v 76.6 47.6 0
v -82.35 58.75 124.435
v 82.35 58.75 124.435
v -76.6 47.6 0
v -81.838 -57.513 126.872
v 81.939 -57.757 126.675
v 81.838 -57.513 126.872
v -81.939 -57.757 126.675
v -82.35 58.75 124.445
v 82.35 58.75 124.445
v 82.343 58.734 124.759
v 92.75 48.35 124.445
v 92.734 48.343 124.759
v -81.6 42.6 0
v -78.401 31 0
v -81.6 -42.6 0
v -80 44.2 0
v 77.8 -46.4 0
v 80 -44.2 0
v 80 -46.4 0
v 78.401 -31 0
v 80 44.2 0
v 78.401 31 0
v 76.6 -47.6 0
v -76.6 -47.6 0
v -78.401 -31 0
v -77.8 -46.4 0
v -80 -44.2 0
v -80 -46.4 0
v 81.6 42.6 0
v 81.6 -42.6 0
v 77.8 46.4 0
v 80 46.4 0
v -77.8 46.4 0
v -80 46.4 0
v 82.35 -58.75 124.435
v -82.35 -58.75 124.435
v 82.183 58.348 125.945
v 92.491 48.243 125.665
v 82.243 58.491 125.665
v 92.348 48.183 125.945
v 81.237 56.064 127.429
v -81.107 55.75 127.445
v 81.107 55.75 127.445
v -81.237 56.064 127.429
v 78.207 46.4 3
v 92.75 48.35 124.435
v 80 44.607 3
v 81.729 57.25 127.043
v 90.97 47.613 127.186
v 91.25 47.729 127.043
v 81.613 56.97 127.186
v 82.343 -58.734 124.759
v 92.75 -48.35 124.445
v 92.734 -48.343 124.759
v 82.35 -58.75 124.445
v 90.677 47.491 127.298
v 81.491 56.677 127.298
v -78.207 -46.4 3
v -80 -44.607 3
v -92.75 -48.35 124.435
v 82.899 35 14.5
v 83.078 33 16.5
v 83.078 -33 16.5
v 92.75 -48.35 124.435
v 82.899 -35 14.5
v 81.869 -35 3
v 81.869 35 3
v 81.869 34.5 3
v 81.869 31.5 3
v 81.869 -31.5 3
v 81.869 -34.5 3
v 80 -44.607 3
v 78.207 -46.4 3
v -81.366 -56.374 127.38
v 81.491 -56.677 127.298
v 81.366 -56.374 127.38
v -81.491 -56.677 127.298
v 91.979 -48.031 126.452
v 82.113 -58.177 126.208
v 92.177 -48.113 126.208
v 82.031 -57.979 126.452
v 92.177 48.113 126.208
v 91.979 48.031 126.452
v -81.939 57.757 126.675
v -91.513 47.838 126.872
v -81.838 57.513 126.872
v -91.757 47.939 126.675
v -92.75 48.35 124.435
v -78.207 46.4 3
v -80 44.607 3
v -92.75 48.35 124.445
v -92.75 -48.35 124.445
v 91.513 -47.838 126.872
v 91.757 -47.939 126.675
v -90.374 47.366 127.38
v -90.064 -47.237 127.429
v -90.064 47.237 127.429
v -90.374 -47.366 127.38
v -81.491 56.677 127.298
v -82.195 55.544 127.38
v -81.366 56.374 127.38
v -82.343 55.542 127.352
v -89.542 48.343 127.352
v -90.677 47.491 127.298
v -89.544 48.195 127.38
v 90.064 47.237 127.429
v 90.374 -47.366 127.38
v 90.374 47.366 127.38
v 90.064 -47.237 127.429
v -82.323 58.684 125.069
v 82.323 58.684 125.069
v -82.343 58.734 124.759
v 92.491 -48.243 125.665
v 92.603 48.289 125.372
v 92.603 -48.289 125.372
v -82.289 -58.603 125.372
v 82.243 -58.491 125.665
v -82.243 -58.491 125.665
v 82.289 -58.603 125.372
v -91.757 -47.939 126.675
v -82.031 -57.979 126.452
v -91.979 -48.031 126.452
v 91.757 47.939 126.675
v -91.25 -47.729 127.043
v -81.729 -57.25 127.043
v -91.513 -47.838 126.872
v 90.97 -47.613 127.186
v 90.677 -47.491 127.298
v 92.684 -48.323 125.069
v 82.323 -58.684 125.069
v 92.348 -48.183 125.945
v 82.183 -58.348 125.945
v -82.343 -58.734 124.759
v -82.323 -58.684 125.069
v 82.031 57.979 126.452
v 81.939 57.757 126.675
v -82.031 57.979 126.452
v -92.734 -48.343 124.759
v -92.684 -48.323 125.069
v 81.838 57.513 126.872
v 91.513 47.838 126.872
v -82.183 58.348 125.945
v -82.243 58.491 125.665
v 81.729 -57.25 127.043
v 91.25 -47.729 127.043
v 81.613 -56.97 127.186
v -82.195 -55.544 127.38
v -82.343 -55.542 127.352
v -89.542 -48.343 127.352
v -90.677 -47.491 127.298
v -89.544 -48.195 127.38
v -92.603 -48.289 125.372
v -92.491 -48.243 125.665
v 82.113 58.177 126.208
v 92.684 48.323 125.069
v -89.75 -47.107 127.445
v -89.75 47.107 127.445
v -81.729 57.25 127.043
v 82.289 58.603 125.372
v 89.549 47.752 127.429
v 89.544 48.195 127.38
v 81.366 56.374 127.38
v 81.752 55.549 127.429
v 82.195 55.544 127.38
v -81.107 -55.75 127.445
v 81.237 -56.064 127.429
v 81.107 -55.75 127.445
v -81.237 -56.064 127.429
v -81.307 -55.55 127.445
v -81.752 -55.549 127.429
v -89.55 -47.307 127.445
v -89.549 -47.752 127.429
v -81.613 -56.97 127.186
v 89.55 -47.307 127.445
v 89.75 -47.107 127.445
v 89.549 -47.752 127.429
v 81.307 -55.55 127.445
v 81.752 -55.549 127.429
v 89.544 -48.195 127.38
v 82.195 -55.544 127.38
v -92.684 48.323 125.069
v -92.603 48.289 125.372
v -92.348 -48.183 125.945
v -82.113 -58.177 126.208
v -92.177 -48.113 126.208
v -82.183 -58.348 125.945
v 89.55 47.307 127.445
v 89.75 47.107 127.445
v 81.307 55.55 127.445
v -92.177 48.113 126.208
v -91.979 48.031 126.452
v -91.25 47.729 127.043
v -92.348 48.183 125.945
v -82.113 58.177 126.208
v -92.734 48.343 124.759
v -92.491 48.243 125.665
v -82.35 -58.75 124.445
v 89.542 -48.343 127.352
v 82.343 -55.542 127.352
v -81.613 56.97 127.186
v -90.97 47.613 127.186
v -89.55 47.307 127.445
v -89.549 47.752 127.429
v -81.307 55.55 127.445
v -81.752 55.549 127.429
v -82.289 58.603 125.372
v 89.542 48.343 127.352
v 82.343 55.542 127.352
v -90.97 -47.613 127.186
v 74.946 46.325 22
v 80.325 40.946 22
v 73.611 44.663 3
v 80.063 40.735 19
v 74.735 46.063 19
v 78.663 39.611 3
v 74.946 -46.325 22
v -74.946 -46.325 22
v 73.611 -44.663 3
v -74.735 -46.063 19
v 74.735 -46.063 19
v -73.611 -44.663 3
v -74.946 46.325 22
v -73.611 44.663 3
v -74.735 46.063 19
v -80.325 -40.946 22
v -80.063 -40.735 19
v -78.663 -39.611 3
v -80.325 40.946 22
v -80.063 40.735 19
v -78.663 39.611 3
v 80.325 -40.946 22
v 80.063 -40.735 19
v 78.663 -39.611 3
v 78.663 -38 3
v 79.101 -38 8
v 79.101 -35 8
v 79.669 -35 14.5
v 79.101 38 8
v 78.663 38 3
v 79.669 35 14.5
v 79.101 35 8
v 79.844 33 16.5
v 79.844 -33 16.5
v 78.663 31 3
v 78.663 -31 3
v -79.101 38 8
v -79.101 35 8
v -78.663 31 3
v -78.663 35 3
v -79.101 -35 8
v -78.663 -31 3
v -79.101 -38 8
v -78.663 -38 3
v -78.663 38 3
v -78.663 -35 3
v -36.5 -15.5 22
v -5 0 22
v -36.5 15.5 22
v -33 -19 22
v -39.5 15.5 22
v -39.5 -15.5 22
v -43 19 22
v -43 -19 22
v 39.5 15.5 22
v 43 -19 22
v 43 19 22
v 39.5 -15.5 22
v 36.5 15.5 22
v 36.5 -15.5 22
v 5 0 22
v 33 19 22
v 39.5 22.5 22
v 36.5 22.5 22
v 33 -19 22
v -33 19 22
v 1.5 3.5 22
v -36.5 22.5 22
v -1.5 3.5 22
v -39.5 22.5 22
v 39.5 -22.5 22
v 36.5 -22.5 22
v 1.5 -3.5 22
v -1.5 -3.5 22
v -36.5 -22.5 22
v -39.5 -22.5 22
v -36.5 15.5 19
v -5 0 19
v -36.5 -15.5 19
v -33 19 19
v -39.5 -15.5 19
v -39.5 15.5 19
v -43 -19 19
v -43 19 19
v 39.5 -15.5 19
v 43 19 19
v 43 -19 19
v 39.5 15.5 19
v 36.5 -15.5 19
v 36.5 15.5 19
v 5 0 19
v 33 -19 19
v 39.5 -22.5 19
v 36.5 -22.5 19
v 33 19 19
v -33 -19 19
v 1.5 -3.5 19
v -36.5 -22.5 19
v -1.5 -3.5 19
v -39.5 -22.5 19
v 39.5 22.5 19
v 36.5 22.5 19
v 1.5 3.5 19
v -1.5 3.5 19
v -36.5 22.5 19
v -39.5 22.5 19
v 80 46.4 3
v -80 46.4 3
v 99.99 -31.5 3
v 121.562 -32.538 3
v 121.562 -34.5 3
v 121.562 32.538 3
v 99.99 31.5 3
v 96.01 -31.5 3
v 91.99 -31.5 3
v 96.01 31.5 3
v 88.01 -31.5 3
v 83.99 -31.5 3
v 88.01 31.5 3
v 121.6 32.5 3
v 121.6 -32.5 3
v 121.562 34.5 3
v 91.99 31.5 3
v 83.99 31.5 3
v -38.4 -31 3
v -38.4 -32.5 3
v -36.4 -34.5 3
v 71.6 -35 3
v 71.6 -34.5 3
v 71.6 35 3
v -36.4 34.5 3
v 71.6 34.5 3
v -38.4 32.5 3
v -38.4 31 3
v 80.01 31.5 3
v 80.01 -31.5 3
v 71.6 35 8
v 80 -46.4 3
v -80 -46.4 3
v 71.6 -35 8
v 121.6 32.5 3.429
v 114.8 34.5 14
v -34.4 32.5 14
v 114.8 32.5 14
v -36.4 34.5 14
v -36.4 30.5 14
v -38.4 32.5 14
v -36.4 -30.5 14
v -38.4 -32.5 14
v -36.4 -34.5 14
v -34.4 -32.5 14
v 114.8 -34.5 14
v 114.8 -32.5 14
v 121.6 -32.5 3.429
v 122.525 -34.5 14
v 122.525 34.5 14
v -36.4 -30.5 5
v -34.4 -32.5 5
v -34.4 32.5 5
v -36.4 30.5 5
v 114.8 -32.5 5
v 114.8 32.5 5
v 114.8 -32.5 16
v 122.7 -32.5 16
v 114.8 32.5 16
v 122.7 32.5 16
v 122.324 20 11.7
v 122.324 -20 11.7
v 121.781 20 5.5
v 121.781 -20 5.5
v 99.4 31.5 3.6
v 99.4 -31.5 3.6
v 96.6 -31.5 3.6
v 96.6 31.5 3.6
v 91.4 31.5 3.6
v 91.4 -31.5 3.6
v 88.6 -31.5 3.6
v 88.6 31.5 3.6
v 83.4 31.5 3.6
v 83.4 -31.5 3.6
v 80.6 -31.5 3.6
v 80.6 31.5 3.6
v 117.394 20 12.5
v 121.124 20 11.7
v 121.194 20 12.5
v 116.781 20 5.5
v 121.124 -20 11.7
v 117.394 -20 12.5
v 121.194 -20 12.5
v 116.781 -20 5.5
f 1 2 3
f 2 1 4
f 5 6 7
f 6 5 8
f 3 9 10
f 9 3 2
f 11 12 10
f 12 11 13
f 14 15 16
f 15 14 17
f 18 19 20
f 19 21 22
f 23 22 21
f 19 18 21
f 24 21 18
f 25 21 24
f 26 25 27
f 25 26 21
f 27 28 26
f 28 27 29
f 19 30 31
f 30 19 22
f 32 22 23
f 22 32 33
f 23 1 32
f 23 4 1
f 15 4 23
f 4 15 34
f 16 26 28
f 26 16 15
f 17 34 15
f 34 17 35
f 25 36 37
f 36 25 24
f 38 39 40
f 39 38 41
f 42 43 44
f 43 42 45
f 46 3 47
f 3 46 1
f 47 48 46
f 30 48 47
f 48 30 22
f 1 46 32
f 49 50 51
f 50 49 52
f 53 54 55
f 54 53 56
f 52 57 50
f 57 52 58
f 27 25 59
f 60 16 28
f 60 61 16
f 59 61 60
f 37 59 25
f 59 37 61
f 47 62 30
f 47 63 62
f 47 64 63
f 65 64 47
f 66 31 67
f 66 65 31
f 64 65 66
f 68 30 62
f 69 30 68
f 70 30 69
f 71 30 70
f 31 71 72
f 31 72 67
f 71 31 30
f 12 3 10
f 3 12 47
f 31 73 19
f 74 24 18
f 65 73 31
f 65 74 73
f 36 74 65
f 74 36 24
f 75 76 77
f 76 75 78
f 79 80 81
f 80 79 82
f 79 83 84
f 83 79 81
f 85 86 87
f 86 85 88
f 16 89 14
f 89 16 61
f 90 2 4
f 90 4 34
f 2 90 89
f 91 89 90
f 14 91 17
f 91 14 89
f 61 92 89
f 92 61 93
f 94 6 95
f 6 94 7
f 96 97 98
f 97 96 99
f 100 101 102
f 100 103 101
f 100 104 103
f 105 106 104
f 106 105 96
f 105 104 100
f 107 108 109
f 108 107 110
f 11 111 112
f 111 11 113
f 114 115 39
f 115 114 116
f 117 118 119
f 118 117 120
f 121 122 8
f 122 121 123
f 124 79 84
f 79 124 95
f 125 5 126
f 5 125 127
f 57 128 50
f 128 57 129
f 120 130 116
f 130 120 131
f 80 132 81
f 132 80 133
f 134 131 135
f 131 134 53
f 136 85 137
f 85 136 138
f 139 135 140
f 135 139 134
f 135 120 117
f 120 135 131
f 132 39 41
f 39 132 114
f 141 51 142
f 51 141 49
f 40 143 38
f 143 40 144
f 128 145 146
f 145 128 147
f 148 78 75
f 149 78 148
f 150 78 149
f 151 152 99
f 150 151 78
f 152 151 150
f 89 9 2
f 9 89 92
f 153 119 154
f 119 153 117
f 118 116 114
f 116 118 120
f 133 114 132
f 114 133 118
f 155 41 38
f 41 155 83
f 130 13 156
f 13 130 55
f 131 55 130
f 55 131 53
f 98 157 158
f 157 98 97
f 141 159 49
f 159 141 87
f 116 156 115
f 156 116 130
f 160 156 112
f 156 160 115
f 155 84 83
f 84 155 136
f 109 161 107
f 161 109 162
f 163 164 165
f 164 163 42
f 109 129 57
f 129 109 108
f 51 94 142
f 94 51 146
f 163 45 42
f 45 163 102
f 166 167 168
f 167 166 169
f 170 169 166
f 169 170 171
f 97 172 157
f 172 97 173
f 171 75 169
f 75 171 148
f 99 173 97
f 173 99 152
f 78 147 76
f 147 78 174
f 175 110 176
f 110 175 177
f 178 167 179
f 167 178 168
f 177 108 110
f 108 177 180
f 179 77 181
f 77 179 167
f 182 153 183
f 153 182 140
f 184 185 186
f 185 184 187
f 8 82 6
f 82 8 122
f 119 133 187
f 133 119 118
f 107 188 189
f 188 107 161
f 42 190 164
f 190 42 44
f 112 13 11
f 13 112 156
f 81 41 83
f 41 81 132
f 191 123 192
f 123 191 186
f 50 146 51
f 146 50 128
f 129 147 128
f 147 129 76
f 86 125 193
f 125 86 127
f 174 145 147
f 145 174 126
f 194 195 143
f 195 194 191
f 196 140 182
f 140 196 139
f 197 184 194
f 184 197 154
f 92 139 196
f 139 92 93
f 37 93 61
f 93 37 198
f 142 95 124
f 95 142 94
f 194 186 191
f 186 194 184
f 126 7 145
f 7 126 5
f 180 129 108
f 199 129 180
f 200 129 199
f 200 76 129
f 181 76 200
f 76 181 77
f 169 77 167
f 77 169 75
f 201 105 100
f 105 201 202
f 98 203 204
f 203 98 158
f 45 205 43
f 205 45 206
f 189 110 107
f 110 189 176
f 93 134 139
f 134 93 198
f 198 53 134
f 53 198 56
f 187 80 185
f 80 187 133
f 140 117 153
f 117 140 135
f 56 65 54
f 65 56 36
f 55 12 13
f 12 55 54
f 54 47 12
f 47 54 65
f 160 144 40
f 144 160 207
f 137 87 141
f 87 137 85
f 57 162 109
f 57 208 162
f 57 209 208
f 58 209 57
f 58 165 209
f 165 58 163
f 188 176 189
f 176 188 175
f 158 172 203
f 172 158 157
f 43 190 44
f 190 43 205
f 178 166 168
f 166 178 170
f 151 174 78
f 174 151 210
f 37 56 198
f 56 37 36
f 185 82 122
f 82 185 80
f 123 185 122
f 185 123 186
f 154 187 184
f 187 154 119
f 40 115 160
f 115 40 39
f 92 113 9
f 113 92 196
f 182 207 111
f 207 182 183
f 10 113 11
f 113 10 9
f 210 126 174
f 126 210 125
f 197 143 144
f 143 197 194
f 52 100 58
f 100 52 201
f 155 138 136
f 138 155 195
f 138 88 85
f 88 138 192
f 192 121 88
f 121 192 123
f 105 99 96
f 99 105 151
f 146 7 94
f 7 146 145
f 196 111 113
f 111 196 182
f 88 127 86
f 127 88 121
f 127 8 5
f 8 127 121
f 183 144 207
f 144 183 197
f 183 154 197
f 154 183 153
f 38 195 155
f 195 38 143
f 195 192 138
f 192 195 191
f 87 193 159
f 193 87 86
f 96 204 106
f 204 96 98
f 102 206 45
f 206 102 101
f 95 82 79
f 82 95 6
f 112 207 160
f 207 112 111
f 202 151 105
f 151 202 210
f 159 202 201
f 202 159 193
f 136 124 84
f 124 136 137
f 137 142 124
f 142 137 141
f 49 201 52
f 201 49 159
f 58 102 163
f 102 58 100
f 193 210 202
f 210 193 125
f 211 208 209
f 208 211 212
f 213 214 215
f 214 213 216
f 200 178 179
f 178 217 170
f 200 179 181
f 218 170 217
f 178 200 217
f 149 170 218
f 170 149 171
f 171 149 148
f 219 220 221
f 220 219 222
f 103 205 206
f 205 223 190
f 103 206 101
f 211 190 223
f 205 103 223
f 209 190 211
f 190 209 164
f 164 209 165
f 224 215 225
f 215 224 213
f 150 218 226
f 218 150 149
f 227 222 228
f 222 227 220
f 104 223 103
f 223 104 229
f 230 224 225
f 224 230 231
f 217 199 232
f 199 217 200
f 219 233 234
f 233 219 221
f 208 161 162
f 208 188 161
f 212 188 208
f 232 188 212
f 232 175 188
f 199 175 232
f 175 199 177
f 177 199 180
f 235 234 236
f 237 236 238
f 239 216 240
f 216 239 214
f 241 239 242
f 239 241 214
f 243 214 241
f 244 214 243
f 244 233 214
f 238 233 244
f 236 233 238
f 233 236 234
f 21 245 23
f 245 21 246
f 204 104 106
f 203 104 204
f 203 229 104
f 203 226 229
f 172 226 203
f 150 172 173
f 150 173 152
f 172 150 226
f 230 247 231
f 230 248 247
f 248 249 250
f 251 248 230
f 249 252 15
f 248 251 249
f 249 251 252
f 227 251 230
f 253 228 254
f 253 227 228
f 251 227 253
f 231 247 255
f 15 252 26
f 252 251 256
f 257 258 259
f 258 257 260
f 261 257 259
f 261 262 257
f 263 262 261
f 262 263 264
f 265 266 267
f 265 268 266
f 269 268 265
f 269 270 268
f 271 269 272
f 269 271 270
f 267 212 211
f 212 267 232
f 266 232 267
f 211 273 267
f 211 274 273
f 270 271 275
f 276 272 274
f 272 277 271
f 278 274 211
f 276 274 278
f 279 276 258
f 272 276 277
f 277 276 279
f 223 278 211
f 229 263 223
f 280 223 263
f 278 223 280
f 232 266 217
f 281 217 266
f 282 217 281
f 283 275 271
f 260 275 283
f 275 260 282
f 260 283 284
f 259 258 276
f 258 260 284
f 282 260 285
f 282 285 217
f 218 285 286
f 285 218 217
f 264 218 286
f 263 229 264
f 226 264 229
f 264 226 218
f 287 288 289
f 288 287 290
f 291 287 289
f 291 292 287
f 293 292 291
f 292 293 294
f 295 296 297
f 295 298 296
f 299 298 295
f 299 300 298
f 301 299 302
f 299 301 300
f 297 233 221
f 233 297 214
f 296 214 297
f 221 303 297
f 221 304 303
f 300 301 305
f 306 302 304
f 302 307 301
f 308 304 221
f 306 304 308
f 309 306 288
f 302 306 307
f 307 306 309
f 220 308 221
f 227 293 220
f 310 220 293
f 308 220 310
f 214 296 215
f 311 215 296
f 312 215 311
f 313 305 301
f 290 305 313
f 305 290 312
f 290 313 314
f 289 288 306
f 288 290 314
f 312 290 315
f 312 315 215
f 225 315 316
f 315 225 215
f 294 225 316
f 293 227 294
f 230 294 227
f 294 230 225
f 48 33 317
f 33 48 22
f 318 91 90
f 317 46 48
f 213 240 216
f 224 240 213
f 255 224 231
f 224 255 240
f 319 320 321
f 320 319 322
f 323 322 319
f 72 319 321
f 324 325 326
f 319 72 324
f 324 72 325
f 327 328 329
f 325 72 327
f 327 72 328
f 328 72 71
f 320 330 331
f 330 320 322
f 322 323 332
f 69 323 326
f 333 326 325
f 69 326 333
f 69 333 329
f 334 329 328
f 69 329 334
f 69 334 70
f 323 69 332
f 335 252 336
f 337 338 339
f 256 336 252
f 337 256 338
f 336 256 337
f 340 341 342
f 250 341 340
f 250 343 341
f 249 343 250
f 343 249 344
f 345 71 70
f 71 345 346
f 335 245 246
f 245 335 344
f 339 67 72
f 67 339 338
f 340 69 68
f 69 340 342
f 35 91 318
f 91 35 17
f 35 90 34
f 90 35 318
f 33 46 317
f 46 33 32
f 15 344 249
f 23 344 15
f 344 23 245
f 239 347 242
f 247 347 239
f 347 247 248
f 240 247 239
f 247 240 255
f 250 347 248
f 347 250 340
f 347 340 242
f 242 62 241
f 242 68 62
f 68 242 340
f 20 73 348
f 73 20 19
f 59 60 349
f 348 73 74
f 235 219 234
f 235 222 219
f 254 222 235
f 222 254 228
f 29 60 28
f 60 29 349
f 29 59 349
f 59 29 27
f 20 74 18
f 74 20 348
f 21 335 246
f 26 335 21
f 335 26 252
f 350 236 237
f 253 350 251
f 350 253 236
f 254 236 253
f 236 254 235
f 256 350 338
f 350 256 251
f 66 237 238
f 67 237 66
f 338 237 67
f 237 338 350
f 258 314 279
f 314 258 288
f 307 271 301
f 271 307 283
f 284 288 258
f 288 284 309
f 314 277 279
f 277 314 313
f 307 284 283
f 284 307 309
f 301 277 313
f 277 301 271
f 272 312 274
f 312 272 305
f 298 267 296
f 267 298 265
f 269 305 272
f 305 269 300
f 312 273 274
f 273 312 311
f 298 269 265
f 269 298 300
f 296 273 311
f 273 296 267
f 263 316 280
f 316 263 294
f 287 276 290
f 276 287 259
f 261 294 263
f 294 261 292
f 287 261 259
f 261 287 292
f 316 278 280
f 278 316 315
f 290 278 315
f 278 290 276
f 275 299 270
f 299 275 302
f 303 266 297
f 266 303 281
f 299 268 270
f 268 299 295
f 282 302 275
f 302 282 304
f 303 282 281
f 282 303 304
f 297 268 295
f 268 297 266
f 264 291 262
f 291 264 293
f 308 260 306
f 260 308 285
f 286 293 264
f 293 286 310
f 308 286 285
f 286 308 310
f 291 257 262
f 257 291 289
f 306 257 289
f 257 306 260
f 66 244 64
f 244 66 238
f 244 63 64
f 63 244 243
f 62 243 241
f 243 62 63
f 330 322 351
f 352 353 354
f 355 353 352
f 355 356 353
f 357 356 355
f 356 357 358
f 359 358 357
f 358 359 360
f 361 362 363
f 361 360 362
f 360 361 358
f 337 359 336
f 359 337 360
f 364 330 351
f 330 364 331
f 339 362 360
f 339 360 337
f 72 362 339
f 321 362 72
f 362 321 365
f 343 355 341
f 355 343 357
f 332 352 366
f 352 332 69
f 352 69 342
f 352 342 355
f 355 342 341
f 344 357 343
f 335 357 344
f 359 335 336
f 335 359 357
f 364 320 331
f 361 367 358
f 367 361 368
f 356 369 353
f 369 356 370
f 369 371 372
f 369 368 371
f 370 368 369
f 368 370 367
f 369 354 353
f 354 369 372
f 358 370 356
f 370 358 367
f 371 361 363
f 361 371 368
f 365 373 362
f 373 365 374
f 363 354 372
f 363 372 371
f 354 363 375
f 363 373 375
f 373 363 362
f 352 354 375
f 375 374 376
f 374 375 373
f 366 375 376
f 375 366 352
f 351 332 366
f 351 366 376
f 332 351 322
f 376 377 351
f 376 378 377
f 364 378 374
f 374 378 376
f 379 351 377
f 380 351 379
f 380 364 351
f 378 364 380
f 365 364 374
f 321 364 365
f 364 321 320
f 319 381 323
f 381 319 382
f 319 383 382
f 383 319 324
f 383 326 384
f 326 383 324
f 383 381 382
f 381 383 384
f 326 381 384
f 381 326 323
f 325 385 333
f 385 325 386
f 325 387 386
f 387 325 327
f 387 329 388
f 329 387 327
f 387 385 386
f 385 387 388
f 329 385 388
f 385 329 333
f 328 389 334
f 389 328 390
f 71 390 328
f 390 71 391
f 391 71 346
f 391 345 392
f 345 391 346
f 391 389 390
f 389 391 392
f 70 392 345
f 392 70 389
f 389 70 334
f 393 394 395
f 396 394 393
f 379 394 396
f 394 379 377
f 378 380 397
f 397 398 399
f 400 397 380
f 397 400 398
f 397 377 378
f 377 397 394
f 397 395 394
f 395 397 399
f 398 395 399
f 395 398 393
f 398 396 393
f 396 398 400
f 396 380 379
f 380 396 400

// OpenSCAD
// Marsh repot liner — rebuilt from "Marsh repot - FIX flat rim setback.step"
// (two-body Fusion export, 2026-07-10) plus the user's section screenshots.
// Dimensions taken from per-body vertex extraction; see comments.
//
// TWO PARTS: set `part` to "pot", "tray", or "all" (assembly preview;
// `pullout` slides the tray out along +X for illustration).
//
// PRINT ORIENTATION (pot): on its BACK face — the +X end wall — rotated
// (90 - draft) about Y so that wall lies flat: 85deg at the current 5deg
// draft. Hanging tension then runs along layer planes [25]. The drawer
// slot lives in that same wall, so in use it faces the wall it hangs on
// and the pot reads as an unbroken solid from the front and sides.
// The tray prints as modelled: flat on the bed, basin up.
//
// v018: two changes.
//   - Finger pocket DEEPENED for easy use: pocket_d 2.2 -> 5.0 (a real
//     first-knuckle hook), mouth raised to 6.2mm (pocket_z1 9.5, nib
//     1.2 x 0.8). The face plate thickened to carry it (face_t 4.4 ->
//     6.8, web behind the pocket ~2.0mm). Pocket roof is now a 3.8mm
//     bridge in the flat tray print — still clean.
//   - Body wall corners: pure 45deg CHAMFERS return (ch_top 10.4 /
//     ch_bot 5, the v009 treatment) in place of v016's round fillets.
//     The "bumps" that prompted v016 were v011's fillet TRANSITION
//     bands, not the chamfer itself: a clean chamfer is two crisp edges
//     and flat planes, matches the 45deg language of the slot, drain
//     hexes, and tray, and prints with no support on the corner rails
//     (the round fillets needed painted supports on the two bed-side
//     rails). The rim keeps the smooth v016 roundover (6deg steps).
//     In the face print the two bed-side chamfer planes sit at 45+draft
//     = 50deg overhang — 5deg past ideal, accepted since v009.
// v017: protruding pull lip replaced by an inset pull: the face plate
//   is a wedge parallel to the back wall's draft plane, parked 0.3mm
//   inside it, with a recessed finger pocket + hook nib. Grip grooves
//   on the tray underside (bay is open below). The whole tray sits
//   strictly inside the pot's hanging silhouette.
// v016: outer surfaces smoothed: round corner fillets (superseded by
//   v018 chamfers), rim roundover swept at 6deg steps (kept), $fn 96.
// v015: the pot HANGS, so the drawer bay carries the tray: two
//   L-section channel rails run the bay's length; the slot bottom sits
//   on a solid sill at sill_h, keeping the skirt ring continuous.
// v014: hex band, struts, and captive drip tray REMOVED. The under-floor
//   bay became a drawer bay: a slot through the back wall accepts a
//   separate pull-out drip tray under the 5 drainage holes. Visible
//   only from the back.
// v013: flat-rim setback REMOVED. Uniform 3.2mm wall to the top, 3mm
//   outer roundover. Print cost: ~1mm under-curl band, bed-end rim edge.
// v012: rim outer edge rounded with rim_r = 1 (superseded by v013).
// v011: chamfer+fillet corner combo [10] — the transition bands read as
//   bumps; superseded by v016 fillets, then v018 pure chamfers.
// v010: pot elongated until every wall is at a 5deg draft;
//   height = 11.15/tan(5) = 127.44.
// v009: side-print audit fixes: 45deg corner chamfers (restored in
//   v018), hex drainage holes, 3.2mm walls.
// v008: band-to-tray attachment on struts (removed in v014 with band).
// v007: merged into one body (reverted in v014: two parts again).
// v006: exact geometry from the two-body export. Shell taper is LINEAR
//   rim-to-ground: outer 163.2x95.2 at Z0 to 185.5x117.5 at the rim.
//   Skirt is SOLID.
// v005: center tray + windowed ring (architecture right, details wrong).
// v004: 5x 8mm round drainage holes per horticultural guidance, kept
//   (as 10x7 hexes since v009).
// v002/v003: rim setback fix / open-tray rework (superseded).

part    = "all";   // "pot" | "tray" | "all"
pullout = 40;      // assembly preview only: tray drawn out along +X (mm)

$fn = 48;

// --- Shell: linear taper, ground to rim (per-body verts) ---
top_x   = 185.5;
top_y   = 117.5;
bot_x   = 163.2;   // skirt outer at Z=0 (+-81.59)
bot_y   = 95.2;    // (+-47.59)
draft   = 5;       // wall draft, degrees — all four walls
height  = (top_x - bot_x)/2 / tan(draft);   // 127.44 at 5deg
// One height can only set every wall to `draft` because both directions
// share the same half-difference; keep it that way.
assert(abs((top_x - bot_x) - (top_y - bot_y)) < 1e-6,
       "X and Y tapers differ; a single height cannot give one draft");
ch_top  = 10.4;    // 45deg corner chamfer at the rim [v018: crisp again]
ch_bot  = 5;       // 45deg corner chamfer at the base
wall    = 3.2;     // 8x a 0.4mm extrusion line [1]

// --- Rim: uniform wall thickness to the top, rounded outer lip ---
rim_r = 3;   // top-edge roundover; on a 3.2 wall this sweeps to within
             // 0.2mm of the inner face (a near-full-width rounded lip)
assert(rim_r <= wall,
       "rim_r > wall: the roundover would undercut the inner face");

// --- Pot floor (STEP: bottom face Z=19, top ~22) ---
floor_bot = 19;
floor_top = 22;

// Drainage: 5 holes (v004 horticultural spec), hexagonal for the face
// print — pointed along pot-X so the points face print-vertical [3,4].
// 10x7 hex ~= 45mm2 open, matching the previous 8mm round hole.
drain_x  = 10;     // point-to-point, along pot-X
drain_y  = 7;      // across, along pot-Y
hole_pos = [[0, 0], [38, 19], [-38, 19], [38, -19], [-38, -19]];

// --- Drawer slot (back wall = +X end wall, the print-bed face) ---
sill_h    = 3;     // solid sill below the slot; its top is the channel
                   // floor at the back, and it keeps the skirt ring whole
slot_open = 13.5;  // opening height above the sill
slot_w    = 70;    // opening width, centered in Y
slot_top  = sill_h + slot_open;   // 16.5
slot_ch   = 2;     // 45deg chamfer on the slot's top corners
tray_clr  = 0.5;   // per-side clearance, slot to tray
assert(slot_top <= floor_bot - 2,
       "slot too tall: keep a solid lintel band below the pot floor");
assert(slot_w/2 <= bot_y/2 - wall - ch_bot,
       "slot_w too wide: slot must stay in the flat of the back wall");

// --- Channel rails: L-section, one per side, full bay length ---
rail_under = 3.5;  // shelf reach beneath each tray edge
rail_lip_t = 3;    // upstand thickness
rail_lip_h = 8;    // upstand height (guides the basin's lower half)
rail_gap   = 0.5;  // lateral clearance, tray edge to upstand

// --- Pull-out drip tray (modelled with its bottom at Z0 = as printed;
//     seated in the pot it rides the channel at Z = sill_h) ---
tray_len   = 160;    // front edge stops 0.26 shy of the far wall when
                     // the face plate is flush with the back at Z0
tray_w     = slot_w - 2*tray_clr;   // 69
tray_wall  = 2;      // basin wall
tray_floor = 2;      // basin floor plate
tray_rim   = 11;     // basin wall height (passes the opening with air)
tray_ch    = 2;      // basin corner chamfer, in plan
face_t     = 6.8;    // face plate thickness at its base — thick enough
                     // to hide the deep finger pocket behind a 2mm web
face_h     = slot_open - tray_clr;  // 13
face_setback = 0.3;  // face plane parked this far inside the wall plane

// Inset pull: finger pocket recessed into the face plate [v017; v018
// deepened for a proper first-knuckle hook].
pocket_w  = 40;      // opening width, centered
pocket_d  = 5.0;     // depth, measured from the (drafted) face plane
pocket_z0 = 2.5;     // pocket floor (tray-local Z)
pocket_z1 = 9.5;     // hook shelf: flat roof your fingertip curls behind
nib_d     = 1.2;     // nib at the shelf's outer edge...
nib_h     = 0.8;     //   ...hangs this far below the shelf

// Grip grooves across the tray's underside near the back — the bay is
// open beneath, so a fingertip can drag the tray out from below.
grip_n     = 3;
grip_w     = 4;      // groove width (45deg-chamfered sides, prints flat)
grip_d     = 0.6;    // depth into the tray_floor plate
grip_x0    = 58;     // outermost groove center (pot X)
grip_pitch = 8;

assert(tray_rim < slot_open - tray_clr, "basin rim cannot pass the slot");
assert(sill_h + face_h + tray_clr <= slot_top,
       "face plate taller than the opening above the sill");
assert(pocket_z1 <= face_h - 3,
       "pocket shelf too high: keep a stiff rail above the pocket");
assert(face_t - face_setback + (pocket_z0 + sill_h)*tan(draft) - pocket_d
           >= 1.6,
       "pocket too deep: <1.6mm web behind the finger pocket");
assert(grip_d <= tray_floor - 1.2,
       "grip grooves too deep for the tray floor plate");

back_x = bot_x/2;    // back wall outer plane at Z0 (the flush reference)
// Insertion stop: front edge meets the far wall inner face at sill_h.
assert(back_x - tray_len >= -(bot_x/2 - wall) - sill_h*tan(draft),
       "tray_len too long: front edge starts inside the far wall");

// Rail cross-section, derived from the tray so the fit is definitional:
rail_y_in   = tray_w/2 - rail_under;          // shelf inner edge (31)
rail_lip_in = tray_w/2 + rail_gap;            // upstand inner face (35)
rail_y_weld = bot_y/2 - wall + 2;             // buried into the skirt
rail_x_end  = bot_x/2 - 1.6;                  // buried into both end walls
assert(rail_lip_in >= slot_w/2 - 0.01,
       "upstand faces must not sit inside the slot side walls");

eps = 0.01;

// Chamfered-rectangle corner points — the design language throughout:
// body shell, floor plinth, slot, and tray all share it [v018].
function cham_pts(x, y, ch) =
    [[-x/2 + ch, -y/2], [x/2 - ch, -y/2], [x/2, -y/2 + ch],
     [x/2,  y/2 - ch], [x/2 - ch,  y/2], [-x/2 + ch,  y/2],
     [-x/2,  y/2 - ch], [-x/2, -y/2 + ch]];

// Rectangle with sharp 45deg chamfered corners, extruded. `inset`
// shrinks the whole outline by a parallel offset (edges stay sharp) —
// used to build the rim roundover slices.
module hex_prism(x, y, h, ch, inset = 0) {
    linear_extrude(height = h)
        offset(delta = -inset) polygon(cham_pts(x, y, ch));
}

// Outer shell with a rounded top edge: the hull's top is a stack of
// inset slices tracing a quarter-round of radius rim_r, at 6deg steps.
// Bottom and top outlines are both 8-gons with matching vertex order,
// so the hull's wall and chamfer planes are crease-free.
module outer_shell() {
    hull() {
        hex_prism(bot_x, bot_y, eps, ch_bot);
        for (t = [0 : 6 : 90])
            translate([0, 0, height - rim_r + rim_r*sin(t) - eps])
                hex_prism(top_x, top_y, eps, ch_top,
                          inset = rim_r*(1 - cos(t)));
    }
}

// Tapered shell: hull of two chamfered prisms.
module shell(bx, by, tx, ty, h, cb, ct) {
    hull() {
        hex_prism(bx, by, eps, cb);
        translate([0, 0, h - eps]) hex_prism(tx, ty, eps, ct);
    }
}

// Drainage hexagon: pointed along pot-X (print-vertical when the floor
// prints as a vertical wall), 45deg point slopes, punched along pot-Z.
module drain_hole() {
    hu = drain_x/2; hv = drain_y/2; rise = hv;   // rise = hv -> 45deg
    linear_extrude(height = floor_top - floor_bot + 4, center = true)
        polygon([[-hu, 0], [-hu + rise, hv], [hu - rise, hv],
                 [hu, 0], [hu - rise, -hv], [-hu + rise, -hv]]);
}

function ox(z) = bot_x + (top_x - bot_x) * z / height;
function oy(z) = bot_y + (top_y - bot_y) * z / height;

module cavity() {
    translate([0, 0, -eps])
        shell(bot_x - 2*wall, bot_y - 2*wall,
              top_x - 2*wall, top_y - 2*wall,
              height + 2*eps, ch_bot, max(ch_top - wall, 1));
}

// Slot / face-plate profile in the Y-Z plane: flat bottom at `bot`,
// 45deg chamfers on the top two corners only (the bottom rides the
// sill / channel floor).
function slot_pts(w, h, ch, bot) =
    [[-w/2, bot], [w/2, bot], [w/2, h - ch], [w/2 - ch, h],
     [-w/2 + ch, h], [-w/2, h - ch]];

// Punch the drawer slot along +X through the back wall, from the sill
// top up. The wall leans outward with height (5deg draft), so the
// cutter runs from inside the empty bay to well past the outer face.
module slot_cut() {
    run = 10 + wall + slot_top*tan(draft) + 5;
    translate([back_x - 10, 0, 0])
        rotate([90, 0, 90])
            linear_extrude(height = run)
                polygon(slot_pts(slot_w, slot_top, slot_ch, sill_h));
}

// Channel rails: an L per side — shelf under the tray edge, upstand
// beside it. Both run the full bay length and bury into the skirt side
// walls and both end walls. In the face print these are vertical fins:
// no overhangs.
module rails() {
    for (m = [0, 1]) mirror([0, m, 0]) {
        // Shelf: channel floor, continuous with the sill top.
        translate([-rail_x_end, rail_y_in, 0])
            cube([2*rail_x_end, rail_y_weld - rail_y_in, sill_h]);
        // Upstand: lateral guide, coplanar with the slot side wall.
        translate([-rail_x_end, rail_lip_in, 0])
            cube([2*rail_x_end, rail_lip_t, rail_lip_h]);
    }
}

// Drainage must drip inside the tray basin (checked against the basin's
// inner faces with the tray fully seated).
basin_in_y  = tray_w/2 - tray_wall;
basin_in_x0 = back_x - tray_len + tray_wall;   // front inner face
basin_in_x1 = back_x - face_t;                 // face-plate inner face
function holes_over_tray() =
    [for (p = hole_pos)
        assert(p[0] + drain_x/2 < basin_in_x1,
               str("hole at ", p, " past the tray face plate"))
        assert(p[0] - drain_x/2 > basin_in_x0,
               str("hole at ", p, " past the tray front wall"))
        assert(abs(p[1]) + drain_y/2 < basin_in_y,
               str("hole at ", p, " outside the tray basin in Y"))
        p];

module pot() {
    difference() {
        union() {
            // Shell: solid skirt, ground to rim, linear taper.
            difference() {
                outer_shell();
                cavity();
            }
            // Floor.
            intersection() {
                cavity();
                translate([0, 0, floor_bot])
                    hex_prism(ox(floor_top), oy(floor_top),
                              floor_top - floor_bot, ch_bot);
            }
            // Channel rails for the tray.
            rails();
        }

        // Drainage holes through the floor.
        for (p = holes_over_tray())
            translate([p[0], p[1], (floor_bot + floor_top)/2])
                drain_hole();

        // Drawer slot through the back wall, above the sill.
        slot_cut();
    }
}

// Face plane of the seated tray, in tray-local coords (bottom at Z0):
// parallel to the back wall's draft plane, face_setback inside it.
face_x0 = back_x - face_setback + sill_h*tan(draft);   // at tray Z0
function face_x(z) = face_x0 + z*tan(draft);

// Finger pocket cutter: side profile in X-Z, extruded across pocket_w.
// Inner wall parallels the face plane (uniform pocket_d); flat hook
// shelf at pocket_z1 with a nib at its outer edge. All faces are
// vertical walls, up-facing floors, or short bridges in the flat print.
module pocket_cut() {
    pts = [[face_x(pocket_z0) + 2,        pocket_z0],
           [face_x(pocket_z0) - pocket_d, pocket_z0],
           [face_x(pocket_z1) - pocket_d, pocket_z1],
           [face_x(pocket_z1) - nib_d,    pocket_z1],
           [face_x(pocket_z1 - nib_h) - nib_d, pocket_z1 - nib_h],
           [face_x(pocket_z1 - nib_h) + 2,     pocket_z1 - nib_h]];
    rotate([90, 0, 0])
        linear_extrude(height = pocket_w, center = true)
            polygon(pts);
}

// Grip grooves: shallow 45deg-sided channels across the tray underside.
module grip_grooves() {
    for (i = [0 : grip_n - 1])
        translate([grip_x0 - i*grip_pitch, 0, 0])
            rotate([90, 0, 0])
                linear_extrude(height = tray_w - 2*tray_ch - 2,
                               center = true)
                    polygon([[-grip_w/2, -eps], [grip_w/2, -eps],
                             [grip_w/2 - grip_d, grip_d],
                             [-grip_w/2 + grip_d, grip_d]]);
}

// Pull-out drip tray: basin + inset-pull face plate. Modelled with its
// bottom at Z0 (prints as-is, basin up); main() seats it at sill_h.
module tray() {
    xc = back_x - tray_len/2;   // basin center
    difference() {
        union() {
            // Basin: uniform tray_wall walls on a tray_floor plate.
            difference() {
                translate([xc, 0, 0])
                    hex_prism(tray_len, tray_w, tray_rim, tray_ch);
                translate([xc, 0, tray_floor])
                    hex_prism(tray_len - 2*tray_wall,
                              tray_w - 2*tray_wall, tray_rim, tray_ch);
            }
            // Face plate: extruded past the draft plane, then trimmed
            // back to it — a wedge whose outer face parallels the wall.
            difference() {
                translate([back_x - face_t, 0, 0])
                    rotate([90, 0, 90])
                        linear_extrude(height = face_t + 4)
                            polygon(slot_pts(tray_w, face_h, slot_ch, 0));
                translate([face_x0, 0, 0])
                    rotate([0, draft, 0])
                        translate([0, -tray_w, -5])
                            cube([30, 2*tray_w, face_h + 10]);
            }
        }
        // Inset pull.
        pocket_cut();
        // Underside grip.
        grip_grooves();
    }
}

module main() {
    if (part == "pot" || part == "all") pot();
    if (part == "tray") tray();
    if (part == "all")
        translate([pullout, 0, sill_h]) tray();   // seated on the channel
}

if (is_list(holes_over_tray())) main();
